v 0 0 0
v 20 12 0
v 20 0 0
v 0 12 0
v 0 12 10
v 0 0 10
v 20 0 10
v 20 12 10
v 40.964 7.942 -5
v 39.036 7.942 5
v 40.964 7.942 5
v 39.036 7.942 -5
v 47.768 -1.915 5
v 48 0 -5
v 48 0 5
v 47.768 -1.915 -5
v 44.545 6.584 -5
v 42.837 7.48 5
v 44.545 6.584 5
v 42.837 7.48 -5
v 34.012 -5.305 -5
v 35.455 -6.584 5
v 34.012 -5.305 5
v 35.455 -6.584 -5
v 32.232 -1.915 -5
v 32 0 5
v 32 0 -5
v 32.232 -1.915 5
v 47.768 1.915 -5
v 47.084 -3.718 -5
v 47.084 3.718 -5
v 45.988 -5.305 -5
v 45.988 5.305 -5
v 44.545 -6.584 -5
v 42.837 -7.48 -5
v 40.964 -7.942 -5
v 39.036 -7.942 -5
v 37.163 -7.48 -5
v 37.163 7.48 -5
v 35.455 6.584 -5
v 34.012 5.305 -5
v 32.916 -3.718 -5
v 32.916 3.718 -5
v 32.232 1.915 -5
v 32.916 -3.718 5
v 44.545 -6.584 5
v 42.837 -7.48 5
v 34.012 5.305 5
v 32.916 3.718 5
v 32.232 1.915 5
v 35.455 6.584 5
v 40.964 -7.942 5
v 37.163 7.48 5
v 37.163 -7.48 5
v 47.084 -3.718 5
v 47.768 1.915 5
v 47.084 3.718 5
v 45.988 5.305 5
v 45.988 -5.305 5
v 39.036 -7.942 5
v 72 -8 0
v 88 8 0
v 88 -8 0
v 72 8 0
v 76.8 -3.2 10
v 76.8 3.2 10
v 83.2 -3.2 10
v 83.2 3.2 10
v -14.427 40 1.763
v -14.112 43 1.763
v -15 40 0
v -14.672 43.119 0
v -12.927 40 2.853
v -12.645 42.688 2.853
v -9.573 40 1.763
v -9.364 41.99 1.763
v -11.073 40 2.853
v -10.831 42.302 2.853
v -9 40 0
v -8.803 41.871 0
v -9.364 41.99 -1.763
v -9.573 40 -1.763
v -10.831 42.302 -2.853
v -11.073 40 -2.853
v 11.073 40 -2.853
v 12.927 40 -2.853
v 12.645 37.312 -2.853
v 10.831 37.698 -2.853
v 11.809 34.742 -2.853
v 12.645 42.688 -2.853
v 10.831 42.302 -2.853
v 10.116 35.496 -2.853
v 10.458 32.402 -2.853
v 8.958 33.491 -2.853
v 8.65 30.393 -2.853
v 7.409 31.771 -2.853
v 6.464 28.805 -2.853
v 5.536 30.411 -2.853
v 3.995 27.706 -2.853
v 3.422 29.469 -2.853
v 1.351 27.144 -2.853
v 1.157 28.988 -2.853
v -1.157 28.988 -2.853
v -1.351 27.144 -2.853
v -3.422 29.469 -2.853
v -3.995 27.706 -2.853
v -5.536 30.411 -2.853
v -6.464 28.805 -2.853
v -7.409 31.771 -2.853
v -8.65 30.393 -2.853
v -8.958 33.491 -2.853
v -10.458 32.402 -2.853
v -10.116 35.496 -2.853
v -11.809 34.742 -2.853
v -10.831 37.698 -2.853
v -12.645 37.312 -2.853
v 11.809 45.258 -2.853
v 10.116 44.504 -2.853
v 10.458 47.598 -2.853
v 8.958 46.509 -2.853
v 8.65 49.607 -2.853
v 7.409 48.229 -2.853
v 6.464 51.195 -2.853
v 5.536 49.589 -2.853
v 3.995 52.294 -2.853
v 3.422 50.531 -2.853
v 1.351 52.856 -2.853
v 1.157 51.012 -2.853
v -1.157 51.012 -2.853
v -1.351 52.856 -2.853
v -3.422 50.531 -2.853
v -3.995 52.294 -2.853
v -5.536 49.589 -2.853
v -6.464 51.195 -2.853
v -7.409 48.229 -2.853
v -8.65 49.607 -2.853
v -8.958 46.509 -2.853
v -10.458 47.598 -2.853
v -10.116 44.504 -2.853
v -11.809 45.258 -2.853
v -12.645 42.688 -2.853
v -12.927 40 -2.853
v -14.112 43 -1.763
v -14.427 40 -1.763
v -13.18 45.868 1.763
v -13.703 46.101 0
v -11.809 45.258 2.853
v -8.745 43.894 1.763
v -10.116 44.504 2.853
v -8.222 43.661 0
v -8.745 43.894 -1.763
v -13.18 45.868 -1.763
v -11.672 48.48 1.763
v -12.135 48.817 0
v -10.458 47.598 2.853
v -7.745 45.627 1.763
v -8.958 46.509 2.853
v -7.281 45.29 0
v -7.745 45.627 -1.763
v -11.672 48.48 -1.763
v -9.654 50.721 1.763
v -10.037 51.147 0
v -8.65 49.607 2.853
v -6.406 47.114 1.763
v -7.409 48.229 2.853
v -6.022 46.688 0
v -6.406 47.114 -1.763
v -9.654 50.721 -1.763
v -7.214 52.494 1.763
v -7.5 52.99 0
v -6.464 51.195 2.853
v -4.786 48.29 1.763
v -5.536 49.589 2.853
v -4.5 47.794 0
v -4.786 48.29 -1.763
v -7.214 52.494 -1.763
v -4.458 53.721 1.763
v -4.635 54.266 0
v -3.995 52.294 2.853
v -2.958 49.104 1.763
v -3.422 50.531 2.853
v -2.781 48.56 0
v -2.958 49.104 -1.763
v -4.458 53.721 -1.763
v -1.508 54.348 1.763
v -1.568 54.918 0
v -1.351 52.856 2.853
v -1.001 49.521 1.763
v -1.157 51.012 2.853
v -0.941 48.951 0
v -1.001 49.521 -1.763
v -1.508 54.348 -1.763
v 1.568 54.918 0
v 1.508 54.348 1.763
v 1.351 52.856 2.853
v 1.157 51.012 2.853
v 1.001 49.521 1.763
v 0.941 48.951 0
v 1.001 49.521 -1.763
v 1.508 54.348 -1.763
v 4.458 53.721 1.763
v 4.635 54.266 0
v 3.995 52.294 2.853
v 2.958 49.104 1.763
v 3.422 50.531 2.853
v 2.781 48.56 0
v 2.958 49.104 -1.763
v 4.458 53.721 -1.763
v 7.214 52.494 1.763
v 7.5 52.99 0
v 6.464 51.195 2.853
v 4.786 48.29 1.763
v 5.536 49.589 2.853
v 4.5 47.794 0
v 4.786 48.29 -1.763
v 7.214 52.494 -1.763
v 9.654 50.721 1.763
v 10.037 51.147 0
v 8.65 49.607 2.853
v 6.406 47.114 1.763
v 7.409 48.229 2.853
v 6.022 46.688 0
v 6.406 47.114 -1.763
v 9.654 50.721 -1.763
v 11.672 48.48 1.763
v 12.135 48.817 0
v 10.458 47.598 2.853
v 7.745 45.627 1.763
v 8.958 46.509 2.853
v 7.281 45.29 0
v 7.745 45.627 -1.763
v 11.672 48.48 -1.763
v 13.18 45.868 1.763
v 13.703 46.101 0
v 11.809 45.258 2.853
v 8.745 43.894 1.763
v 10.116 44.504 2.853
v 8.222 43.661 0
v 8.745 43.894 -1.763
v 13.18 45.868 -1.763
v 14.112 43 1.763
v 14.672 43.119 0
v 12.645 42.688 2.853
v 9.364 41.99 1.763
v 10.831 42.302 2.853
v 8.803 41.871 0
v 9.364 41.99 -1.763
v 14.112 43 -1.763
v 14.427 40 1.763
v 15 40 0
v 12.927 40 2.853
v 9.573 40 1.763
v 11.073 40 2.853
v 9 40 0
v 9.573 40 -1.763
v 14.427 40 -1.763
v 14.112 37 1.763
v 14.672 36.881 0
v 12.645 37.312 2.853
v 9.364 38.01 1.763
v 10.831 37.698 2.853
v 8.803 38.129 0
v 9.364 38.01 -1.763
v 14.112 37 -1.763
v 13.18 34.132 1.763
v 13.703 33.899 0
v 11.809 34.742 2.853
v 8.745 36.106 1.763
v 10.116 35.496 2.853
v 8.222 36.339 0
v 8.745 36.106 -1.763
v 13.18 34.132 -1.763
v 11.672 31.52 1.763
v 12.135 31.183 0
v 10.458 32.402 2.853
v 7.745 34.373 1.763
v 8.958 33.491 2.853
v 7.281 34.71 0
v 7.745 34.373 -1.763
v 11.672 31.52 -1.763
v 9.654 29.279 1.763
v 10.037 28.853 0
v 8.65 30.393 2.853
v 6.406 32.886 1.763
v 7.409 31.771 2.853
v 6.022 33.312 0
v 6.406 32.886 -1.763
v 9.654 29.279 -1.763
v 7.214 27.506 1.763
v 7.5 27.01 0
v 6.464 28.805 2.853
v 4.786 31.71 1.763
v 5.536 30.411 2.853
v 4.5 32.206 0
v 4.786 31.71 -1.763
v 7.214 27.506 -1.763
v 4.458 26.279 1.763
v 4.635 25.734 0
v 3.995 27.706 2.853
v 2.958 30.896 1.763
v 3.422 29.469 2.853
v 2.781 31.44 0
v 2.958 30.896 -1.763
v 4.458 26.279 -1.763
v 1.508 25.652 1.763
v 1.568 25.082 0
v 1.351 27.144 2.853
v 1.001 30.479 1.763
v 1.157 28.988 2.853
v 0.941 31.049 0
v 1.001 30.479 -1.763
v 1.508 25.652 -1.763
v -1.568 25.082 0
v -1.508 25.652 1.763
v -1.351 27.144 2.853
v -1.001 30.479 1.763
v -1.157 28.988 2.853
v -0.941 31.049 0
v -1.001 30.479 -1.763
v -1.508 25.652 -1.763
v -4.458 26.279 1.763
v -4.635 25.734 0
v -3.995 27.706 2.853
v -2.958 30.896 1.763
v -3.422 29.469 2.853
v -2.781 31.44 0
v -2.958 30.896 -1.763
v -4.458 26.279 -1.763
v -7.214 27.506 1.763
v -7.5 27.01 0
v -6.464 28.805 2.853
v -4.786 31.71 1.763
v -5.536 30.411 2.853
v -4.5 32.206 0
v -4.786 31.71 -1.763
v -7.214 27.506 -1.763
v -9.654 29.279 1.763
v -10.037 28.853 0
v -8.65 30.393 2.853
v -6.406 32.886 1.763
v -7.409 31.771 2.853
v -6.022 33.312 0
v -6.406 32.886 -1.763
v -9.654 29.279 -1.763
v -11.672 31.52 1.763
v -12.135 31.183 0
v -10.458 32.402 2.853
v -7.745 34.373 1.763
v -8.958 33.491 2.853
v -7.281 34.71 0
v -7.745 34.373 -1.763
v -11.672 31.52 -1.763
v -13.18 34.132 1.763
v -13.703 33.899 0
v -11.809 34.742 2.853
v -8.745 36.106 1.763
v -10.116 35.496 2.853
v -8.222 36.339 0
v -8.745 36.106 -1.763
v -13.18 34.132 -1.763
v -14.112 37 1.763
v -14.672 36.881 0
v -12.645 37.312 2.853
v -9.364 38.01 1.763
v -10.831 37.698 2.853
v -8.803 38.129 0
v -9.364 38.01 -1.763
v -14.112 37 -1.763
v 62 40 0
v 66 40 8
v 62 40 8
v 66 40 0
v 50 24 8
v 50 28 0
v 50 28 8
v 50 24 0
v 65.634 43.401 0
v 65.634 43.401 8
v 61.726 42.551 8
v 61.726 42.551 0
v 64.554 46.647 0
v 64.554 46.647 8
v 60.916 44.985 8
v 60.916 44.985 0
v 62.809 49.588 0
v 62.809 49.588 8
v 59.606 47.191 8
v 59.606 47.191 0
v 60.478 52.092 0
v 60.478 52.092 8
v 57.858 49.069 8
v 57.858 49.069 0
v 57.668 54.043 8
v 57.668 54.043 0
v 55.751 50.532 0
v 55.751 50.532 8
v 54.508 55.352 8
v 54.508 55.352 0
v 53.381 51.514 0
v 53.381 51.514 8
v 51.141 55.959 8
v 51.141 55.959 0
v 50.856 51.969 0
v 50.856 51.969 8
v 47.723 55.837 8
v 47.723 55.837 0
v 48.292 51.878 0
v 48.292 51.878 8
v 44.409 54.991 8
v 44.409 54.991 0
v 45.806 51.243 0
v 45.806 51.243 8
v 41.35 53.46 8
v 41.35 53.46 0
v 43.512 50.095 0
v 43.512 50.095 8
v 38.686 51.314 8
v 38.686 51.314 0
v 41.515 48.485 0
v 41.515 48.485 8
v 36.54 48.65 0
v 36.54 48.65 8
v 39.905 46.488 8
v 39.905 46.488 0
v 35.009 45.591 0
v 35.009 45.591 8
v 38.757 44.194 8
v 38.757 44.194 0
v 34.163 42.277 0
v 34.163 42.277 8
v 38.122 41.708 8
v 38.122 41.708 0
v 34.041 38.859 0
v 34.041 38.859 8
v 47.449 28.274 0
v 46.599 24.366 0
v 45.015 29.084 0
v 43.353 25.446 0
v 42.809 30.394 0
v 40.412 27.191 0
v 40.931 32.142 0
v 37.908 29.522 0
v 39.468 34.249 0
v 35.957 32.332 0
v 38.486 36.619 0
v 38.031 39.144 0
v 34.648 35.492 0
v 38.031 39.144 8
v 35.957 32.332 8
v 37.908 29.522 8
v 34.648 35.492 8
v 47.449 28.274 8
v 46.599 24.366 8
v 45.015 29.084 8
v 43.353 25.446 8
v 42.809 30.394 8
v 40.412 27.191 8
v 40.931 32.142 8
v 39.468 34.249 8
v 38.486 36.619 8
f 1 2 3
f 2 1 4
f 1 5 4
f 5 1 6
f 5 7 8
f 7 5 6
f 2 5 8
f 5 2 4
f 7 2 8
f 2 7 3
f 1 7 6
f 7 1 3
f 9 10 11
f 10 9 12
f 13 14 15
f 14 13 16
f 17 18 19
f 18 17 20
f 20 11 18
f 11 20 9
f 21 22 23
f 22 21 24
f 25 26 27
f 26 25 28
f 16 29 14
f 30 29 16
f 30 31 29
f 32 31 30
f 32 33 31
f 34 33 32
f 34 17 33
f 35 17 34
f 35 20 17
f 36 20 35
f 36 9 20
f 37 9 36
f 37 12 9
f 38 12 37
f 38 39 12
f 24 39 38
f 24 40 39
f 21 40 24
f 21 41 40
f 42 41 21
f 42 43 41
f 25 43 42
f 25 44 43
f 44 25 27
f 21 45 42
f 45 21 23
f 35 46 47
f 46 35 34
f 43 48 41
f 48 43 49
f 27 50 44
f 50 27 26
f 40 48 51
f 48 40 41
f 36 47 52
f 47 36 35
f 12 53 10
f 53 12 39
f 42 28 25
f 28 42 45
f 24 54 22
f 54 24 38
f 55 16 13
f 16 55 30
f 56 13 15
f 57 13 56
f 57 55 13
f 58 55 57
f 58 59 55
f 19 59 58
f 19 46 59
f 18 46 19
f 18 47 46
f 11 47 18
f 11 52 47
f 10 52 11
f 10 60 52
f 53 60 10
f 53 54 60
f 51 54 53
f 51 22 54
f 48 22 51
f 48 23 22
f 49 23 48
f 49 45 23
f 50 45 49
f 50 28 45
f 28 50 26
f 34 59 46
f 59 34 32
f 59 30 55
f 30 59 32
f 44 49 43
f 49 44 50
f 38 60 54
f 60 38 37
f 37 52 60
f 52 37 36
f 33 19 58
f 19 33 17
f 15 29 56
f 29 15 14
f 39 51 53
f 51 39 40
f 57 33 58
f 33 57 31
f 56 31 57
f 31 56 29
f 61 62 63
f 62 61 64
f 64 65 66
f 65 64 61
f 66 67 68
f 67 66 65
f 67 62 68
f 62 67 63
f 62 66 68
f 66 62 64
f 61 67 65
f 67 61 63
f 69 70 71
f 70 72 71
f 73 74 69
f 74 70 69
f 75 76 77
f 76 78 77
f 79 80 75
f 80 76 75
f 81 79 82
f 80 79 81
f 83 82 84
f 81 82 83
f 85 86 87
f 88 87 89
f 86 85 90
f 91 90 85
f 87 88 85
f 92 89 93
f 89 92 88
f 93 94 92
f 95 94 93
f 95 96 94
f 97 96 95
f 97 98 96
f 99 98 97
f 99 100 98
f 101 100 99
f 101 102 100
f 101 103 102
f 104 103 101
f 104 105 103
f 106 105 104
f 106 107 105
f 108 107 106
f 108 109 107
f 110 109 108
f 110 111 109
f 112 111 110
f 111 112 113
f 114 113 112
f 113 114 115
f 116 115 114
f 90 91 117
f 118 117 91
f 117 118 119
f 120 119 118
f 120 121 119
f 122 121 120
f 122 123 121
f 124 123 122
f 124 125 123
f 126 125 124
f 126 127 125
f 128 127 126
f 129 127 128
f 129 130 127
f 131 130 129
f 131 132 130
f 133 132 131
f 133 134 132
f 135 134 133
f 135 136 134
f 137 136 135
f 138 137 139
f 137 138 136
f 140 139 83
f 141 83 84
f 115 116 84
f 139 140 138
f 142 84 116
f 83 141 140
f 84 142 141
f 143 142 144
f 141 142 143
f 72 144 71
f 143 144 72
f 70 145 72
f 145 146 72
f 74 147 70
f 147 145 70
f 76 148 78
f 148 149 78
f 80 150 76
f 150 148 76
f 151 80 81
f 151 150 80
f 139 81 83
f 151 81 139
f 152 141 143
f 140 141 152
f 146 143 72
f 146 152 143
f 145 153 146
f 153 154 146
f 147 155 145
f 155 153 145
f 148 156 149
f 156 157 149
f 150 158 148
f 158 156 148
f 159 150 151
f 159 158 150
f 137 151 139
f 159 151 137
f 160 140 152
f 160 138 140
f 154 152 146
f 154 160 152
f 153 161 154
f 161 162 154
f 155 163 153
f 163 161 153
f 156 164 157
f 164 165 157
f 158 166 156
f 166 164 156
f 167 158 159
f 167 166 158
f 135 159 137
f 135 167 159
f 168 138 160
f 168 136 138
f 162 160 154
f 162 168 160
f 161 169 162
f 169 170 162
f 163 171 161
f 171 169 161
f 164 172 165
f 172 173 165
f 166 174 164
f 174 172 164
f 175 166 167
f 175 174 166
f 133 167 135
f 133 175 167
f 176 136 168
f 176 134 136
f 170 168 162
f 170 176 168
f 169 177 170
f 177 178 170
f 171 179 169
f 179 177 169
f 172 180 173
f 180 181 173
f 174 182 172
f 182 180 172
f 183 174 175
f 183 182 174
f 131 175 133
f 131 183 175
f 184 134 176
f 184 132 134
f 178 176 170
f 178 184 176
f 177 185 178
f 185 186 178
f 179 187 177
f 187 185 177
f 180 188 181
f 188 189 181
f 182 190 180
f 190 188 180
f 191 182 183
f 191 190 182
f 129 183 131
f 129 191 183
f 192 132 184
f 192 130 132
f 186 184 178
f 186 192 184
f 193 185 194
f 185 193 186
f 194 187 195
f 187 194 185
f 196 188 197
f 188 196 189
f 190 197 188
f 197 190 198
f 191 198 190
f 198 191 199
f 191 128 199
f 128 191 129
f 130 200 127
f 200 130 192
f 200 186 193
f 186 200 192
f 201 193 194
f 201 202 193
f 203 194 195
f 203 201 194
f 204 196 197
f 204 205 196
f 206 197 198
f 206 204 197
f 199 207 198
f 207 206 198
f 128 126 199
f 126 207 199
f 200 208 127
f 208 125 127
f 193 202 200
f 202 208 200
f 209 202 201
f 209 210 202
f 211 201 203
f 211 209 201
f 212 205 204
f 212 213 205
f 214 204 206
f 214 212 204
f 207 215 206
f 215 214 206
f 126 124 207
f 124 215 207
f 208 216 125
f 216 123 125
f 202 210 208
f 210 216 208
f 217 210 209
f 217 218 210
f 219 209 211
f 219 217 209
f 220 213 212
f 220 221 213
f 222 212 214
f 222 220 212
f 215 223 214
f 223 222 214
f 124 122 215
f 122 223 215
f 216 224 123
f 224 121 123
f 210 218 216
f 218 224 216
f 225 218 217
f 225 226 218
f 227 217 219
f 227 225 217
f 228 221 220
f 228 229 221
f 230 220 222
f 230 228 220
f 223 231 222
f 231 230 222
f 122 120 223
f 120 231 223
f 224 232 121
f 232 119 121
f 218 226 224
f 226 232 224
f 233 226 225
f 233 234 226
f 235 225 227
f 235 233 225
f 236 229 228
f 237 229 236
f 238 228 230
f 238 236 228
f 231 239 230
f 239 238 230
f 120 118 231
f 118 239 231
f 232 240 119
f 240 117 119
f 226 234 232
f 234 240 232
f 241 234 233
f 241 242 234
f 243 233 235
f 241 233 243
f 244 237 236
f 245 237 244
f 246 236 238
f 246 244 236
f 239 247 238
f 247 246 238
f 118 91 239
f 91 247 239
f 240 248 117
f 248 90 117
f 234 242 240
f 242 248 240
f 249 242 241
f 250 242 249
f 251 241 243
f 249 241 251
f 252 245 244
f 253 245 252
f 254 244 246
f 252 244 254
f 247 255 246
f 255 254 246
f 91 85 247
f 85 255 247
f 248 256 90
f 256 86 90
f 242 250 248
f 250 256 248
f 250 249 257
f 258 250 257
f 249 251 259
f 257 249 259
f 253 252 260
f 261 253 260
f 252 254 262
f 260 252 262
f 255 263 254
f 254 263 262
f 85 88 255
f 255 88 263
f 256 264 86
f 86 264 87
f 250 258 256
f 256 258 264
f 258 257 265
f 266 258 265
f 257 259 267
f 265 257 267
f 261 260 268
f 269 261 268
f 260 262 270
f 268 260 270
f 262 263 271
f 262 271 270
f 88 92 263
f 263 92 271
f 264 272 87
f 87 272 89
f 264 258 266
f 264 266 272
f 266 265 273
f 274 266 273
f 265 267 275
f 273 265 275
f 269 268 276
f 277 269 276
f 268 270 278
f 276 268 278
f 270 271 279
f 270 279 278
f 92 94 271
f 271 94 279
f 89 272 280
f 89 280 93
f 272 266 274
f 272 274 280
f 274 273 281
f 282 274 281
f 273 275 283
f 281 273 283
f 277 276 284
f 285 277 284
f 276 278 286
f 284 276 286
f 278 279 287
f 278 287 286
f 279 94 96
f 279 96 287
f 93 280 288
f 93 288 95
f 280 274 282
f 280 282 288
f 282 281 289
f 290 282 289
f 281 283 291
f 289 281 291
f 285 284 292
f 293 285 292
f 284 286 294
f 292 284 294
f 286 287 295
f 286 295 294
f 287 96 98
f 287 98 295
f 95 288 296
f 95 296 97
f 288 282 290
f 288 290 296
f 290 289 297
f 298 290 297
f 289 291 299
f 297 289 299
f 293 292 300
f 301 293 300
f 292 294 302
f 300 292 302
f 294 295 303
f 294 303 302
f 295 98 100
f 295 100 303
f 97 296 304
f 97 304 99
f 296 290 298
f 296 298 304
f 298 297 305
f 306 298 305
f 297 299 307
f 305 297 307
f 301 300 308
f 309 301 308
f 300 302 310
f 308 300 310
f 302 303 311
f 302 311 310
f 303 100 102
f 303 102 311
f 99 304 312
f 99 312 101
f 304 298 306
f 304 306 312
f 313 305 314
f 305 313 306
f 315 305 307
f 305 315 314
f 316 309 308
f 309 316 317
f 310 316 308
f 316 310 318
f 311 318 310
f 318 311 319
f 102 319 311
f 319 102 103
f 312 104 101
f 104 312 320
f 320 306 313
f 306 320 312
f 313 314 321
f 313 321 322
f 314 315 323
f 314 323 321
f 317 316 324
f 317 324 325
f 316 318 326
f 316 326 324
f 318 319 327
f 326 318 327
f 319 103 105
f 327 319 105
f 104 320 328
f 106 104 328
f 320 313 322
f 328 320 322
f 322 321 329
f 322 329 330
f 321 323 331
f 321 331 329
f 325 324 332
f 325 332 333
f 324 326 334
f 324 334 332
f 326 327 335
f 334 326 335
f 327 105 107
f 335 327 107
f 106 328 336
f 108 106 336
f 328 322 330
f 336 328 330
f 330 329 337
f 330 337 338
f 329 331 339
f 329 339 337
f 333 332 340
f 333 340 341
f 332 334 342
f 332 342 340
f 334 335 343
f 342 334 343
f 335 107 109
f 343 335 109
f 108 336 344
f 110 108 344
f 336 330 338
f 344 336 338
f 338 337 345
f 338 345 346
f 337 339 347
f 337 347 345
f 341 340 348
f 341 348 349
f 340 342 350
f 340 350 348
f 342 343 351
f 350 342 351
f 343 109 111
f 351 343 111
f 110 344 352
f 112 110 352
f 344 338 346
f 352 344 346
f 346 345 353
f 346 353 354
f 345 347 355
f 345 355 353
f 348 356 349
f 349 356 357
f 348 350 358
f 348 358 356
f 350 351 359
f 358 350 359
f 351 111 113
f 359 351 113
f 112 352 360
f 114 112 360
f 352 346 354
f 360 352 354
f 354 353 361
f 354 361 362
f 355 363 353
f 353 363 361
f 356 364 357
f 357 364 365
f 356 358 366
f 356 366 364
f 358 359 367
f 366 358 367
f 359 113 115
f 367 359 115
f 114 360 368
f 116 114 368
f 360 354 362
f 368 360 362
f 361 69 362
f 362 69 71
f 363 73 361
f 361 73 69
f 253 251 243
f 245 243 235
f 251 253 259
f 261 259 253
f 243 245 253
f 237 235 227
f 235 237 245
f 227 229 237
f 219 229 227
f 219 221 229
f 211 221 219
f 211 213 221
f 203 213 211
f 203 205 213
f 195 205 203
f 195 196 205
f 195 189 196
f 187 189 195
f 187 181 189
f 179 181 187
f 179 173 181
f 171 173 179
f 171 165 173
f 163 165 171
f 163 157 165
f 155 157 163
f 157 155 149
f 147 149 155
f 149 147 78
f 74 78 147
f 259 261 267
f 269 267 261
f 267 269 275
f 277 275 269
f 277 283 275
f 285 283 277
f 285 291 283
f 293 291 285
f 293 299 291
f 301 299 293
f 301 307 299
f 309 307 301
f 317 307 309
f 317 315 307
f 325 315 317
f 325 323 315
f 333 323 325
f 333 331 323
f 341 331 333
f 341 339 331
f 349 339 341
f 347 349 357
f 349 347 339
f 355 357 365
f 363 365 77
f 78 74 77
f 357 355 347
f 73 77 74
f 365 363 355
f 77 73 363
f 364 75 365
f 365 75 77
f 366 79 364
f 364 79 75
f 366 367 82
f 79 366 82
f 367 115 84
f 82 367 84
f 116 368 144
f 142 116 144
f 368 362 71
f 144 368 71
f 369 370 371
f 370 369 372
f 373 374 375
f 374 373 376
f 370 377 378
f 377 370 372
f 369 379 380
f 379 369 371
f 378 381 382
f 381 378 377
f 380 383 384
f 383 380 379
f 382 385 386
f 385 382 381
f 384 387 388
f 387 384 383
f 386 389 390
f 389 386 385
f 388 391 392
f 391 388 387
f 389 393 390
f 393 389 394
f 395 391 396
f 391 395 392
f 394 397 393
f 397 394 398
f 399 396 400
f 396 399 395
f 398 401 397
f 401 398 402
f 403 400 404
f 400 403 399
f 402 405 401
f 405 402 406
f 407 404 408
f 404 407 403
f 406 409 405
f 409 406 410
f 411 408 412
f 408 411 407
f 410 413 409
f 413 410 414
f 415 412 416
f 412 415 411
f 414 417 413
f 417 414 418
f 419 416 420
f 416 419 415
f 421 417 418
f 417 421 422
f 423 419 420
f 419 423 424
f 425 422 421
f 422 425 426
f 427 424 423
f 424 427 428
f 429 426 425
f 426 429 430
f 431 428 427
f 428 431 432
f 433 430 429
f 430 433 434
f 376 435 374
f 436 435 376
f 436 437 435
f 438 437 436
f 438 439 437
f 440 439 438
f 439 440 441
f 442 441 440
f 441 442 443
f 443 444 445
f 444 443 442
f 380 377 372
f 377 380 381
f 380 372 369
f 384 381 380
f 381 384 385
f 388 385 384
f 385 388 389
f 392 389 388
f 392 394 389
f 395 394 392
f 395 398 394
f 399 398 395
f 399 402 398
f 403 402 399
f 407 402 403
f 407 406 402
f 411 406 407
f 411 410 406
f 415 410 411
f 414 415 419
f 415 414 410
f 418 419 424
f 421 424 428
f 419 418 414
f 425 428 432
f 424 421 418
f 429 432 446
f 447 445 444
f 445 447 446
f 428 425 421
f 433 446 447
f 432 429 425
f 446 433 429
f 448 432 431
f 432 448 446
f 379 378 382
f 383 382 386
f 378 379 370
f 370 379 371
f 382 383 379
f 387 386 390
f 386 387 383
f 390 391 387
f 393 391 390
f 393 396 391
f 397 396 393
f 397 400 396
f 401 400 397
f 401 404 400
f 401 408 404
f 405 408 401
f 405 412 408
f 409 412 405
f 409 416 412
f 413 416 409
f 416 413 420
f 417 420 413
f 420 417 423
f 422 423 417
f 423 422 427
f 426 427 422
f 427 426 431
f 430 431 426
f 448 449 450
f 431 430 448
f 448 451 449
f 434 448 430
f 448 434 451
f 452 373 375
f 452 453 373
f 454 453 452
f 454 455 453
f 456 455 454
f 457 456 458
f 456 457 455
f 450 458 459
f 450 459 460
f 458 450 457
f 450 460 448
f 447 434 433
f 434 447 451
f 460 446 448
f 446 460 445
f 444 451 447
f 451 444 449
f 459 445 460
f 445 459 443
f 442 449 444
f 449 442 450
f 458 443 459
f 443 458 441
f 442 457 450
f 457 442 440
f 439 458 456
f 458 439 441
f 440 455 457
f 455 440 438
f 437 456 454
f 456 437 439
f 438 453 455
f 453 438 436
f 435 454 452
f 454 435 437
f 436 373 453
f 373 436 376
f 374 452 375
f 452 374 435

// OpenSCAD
linear_extrude(height = 10) square([20, 12]);
translate([40, 0, 0]) linear_extrude(height = 10, center = true) circle(r = 8);
translate([80, 0, 0]) linear_extrude(height = 10, scale = 0.4) square([16, 16], center = true);
translate([0, 40, 0]) rotate_extrude() translate([12, 0]) circle(r = 3);
translate([50, 40, 0]) rotate_extrude(angle = 270) translate([12, 0]) square([4, 8]);
